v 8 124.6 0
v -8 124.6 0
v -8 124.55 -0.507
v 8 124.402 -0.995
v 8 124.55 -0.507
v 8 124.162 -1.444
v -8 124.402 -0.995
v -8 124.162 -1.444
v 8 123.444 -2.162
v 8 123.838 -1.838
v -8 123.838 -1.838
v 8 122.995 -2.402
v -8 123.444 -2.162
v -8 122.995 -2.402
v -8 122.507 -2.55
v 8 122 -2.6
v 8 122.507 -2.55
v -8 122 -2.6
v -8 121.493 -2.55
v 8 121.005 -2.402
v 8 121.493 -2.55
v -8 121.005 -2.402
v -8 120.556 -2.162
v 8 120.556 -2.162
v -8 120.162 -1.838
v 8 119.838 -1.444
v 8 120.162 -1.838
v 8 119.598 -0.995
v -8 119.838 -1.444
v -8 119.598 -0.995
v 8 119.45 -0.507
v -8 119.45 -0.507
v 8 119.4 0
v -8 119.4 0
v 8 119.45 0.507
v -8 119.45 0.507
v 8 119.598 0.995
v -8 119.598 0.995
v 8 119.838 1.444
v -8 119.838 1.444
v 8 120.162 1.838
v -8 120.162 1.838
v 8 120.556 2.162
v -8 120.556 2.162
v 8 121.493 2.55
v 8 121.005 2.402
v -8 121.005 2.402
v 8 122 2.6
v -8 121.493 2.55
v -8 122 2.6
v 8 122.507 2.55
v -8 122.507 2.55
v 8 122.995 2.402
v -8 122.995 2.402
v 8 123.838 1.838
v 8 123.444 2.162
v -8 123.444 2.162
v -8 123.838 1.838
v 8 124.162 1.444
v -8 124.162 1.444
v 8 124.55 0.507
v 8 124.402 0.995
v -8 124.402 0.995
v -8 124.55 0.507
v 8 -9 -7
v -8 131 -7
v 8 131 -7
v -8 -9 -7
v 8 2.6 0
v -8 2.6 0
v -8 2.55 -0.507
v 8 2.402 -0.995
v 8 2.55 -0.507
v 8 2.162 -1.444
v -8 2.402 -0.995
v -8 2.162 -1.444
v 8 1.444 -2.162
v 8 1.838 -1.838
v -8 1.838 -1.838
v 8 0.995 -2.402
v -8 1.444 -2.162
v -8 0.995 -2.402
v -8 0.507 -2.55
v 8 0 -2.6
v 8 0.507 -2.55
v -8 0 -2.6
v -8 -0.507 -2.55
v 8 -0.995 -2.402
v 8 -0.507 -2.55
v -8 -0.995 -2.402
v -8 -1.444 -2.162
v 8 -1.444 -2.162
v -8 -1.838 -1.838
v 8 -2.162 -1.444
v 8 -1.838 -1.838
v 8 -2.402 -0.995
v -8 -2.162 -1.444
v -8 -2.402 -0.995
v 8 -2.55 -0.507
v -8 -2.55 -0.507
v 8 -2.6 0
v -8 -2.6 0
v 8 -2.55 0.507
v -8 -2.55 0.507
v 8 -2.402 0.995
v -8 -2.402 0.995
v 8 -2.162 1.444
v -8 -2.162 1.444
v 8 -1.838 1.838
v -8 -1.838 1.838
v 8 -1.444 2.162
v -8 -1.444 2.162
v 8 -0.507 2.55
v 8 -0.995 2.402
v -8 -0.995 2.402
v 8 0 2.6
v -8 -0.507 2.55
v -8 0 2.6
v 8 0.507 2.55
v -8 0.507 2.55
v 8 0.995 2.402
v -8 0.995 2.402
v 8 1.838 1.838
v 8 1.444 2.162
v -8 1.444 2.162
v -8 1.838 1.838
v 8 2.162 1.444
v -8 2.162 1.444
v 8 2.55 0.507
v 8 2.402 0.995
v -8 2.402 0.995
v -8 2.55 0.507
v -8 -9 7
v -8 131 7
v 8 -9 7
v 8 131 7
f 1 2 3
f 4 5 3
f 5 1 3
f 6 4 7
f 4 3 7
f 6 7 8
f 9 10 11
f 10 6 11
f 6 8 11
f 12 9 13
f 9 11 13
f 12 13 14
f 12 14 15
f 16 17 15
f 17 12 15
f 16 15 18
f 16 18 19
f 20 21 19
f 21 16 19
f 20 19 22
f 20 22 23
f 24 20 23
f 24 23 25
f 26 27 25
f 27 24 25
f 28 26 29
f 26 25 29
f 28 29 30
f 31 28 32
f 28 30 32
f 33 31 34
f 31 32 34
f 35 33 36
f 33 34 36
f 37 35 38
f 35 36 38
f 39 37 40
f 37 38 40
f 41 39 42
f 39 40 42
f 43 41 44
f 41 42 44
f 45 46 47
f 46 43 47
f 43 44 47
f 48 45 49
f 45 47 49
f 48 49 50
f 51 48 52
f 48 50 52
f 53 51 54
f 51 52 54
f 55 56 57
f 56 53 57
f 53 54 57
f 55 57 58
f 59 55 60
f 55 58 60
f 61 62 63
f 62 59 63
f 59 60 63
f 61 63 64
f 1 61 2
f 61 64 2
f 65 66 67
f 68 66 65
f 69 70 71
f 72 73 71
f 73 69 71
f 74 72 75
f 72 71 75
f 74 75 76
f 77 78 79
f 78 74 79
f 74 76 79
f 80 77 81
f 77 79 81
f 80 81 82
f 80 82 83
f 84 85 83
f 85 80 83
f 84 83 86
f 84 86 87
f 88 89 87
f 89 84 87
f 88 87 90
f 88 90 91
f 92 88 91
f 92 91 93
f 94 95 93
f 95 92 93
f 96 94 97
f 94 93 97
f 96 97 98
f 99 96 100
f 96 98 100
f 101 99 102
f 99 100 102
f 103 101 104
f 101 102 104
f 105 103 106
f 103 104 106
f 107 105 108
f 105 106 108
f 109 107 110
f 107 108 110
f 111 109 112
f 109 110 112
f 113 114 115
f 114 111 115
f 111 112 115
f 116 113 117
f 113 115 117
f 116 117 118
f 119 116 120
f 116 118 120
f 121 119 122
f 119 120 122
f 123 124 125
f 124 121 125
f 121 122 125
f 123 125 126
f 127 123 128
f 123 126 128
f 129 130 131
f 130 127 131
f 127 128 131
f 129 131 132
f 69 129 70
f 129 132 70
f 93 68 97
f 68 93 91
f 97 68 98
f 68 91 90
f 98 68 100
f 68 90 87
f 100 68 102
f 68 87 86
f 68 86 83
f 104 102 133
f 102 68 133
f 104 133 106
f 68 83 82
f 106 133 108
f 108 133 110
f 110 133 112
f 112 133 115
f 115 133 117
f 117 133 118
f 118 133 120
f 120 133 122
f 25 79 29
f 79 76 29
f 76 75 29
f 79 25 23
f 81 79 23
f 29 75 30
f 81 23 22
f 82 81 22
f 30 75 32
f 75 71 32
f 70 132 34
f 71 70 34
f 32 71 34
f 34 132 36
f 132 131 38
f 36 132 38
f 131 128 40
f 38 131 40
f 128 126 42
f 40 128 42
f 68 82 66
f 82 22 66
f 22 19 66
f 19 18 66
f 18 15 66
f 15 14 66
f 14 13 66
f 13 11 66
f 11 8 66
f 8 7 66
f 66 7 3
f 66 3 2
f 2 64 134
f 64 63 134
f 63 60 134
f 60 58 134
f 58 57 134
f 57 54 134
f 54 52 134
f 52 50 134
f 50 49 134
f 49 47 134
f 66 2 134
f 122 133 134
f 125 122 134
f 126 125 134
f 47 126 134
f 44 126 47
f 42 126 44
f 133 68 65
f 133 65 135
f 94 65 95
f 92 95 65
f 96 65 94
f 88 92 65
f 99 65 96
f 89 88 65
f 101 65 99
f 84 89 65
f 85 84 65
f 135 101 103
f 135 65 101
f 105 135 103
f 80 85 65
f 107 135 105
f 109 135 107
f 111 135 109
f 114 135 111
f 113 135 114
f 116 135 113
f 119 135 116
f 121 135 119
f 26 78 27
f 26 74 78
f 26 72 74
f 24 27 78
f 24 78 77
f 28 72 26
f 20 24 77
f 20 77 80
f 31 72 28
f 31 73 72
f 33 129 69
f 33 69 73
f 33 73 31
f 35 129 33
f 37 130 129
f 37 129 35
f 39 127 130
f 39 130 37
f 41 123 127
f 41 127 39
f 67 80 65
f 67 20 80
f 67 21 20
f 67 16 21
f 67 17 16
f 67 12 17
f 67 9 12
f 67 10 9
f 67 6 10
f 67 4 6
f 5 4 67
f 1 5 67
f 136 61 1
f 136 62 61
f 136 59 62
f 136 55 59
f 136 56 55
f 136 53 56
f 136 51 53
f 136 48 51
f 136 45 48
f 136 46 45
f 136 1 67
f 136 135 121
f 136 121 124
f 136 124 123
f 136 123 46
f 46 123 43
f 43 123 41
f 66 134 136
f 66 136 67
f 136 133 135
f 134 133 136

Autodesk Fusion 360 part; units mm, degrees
sketch "Sketch1" plane through (0, 0, 0) normal (1, 0, 0) x (0, 1, 0)
  circle A0 centre (0, 0) radius 2.6
  circle A1 centre (122, 0) radius 2.6
  line L0 (-9, 7) -> (131, 7)
  line L1 (131, 7) -> (131, -7)
  line L2 (131, -7) -> (-9, -7)
  line L3 (-9, -7) -> (-9, 7)
  dimension "d1" = 5.2
  dimension "d3" = 5.2
extrude "Extrude1" add sketch "Sketch1" along normal mid plane 16
